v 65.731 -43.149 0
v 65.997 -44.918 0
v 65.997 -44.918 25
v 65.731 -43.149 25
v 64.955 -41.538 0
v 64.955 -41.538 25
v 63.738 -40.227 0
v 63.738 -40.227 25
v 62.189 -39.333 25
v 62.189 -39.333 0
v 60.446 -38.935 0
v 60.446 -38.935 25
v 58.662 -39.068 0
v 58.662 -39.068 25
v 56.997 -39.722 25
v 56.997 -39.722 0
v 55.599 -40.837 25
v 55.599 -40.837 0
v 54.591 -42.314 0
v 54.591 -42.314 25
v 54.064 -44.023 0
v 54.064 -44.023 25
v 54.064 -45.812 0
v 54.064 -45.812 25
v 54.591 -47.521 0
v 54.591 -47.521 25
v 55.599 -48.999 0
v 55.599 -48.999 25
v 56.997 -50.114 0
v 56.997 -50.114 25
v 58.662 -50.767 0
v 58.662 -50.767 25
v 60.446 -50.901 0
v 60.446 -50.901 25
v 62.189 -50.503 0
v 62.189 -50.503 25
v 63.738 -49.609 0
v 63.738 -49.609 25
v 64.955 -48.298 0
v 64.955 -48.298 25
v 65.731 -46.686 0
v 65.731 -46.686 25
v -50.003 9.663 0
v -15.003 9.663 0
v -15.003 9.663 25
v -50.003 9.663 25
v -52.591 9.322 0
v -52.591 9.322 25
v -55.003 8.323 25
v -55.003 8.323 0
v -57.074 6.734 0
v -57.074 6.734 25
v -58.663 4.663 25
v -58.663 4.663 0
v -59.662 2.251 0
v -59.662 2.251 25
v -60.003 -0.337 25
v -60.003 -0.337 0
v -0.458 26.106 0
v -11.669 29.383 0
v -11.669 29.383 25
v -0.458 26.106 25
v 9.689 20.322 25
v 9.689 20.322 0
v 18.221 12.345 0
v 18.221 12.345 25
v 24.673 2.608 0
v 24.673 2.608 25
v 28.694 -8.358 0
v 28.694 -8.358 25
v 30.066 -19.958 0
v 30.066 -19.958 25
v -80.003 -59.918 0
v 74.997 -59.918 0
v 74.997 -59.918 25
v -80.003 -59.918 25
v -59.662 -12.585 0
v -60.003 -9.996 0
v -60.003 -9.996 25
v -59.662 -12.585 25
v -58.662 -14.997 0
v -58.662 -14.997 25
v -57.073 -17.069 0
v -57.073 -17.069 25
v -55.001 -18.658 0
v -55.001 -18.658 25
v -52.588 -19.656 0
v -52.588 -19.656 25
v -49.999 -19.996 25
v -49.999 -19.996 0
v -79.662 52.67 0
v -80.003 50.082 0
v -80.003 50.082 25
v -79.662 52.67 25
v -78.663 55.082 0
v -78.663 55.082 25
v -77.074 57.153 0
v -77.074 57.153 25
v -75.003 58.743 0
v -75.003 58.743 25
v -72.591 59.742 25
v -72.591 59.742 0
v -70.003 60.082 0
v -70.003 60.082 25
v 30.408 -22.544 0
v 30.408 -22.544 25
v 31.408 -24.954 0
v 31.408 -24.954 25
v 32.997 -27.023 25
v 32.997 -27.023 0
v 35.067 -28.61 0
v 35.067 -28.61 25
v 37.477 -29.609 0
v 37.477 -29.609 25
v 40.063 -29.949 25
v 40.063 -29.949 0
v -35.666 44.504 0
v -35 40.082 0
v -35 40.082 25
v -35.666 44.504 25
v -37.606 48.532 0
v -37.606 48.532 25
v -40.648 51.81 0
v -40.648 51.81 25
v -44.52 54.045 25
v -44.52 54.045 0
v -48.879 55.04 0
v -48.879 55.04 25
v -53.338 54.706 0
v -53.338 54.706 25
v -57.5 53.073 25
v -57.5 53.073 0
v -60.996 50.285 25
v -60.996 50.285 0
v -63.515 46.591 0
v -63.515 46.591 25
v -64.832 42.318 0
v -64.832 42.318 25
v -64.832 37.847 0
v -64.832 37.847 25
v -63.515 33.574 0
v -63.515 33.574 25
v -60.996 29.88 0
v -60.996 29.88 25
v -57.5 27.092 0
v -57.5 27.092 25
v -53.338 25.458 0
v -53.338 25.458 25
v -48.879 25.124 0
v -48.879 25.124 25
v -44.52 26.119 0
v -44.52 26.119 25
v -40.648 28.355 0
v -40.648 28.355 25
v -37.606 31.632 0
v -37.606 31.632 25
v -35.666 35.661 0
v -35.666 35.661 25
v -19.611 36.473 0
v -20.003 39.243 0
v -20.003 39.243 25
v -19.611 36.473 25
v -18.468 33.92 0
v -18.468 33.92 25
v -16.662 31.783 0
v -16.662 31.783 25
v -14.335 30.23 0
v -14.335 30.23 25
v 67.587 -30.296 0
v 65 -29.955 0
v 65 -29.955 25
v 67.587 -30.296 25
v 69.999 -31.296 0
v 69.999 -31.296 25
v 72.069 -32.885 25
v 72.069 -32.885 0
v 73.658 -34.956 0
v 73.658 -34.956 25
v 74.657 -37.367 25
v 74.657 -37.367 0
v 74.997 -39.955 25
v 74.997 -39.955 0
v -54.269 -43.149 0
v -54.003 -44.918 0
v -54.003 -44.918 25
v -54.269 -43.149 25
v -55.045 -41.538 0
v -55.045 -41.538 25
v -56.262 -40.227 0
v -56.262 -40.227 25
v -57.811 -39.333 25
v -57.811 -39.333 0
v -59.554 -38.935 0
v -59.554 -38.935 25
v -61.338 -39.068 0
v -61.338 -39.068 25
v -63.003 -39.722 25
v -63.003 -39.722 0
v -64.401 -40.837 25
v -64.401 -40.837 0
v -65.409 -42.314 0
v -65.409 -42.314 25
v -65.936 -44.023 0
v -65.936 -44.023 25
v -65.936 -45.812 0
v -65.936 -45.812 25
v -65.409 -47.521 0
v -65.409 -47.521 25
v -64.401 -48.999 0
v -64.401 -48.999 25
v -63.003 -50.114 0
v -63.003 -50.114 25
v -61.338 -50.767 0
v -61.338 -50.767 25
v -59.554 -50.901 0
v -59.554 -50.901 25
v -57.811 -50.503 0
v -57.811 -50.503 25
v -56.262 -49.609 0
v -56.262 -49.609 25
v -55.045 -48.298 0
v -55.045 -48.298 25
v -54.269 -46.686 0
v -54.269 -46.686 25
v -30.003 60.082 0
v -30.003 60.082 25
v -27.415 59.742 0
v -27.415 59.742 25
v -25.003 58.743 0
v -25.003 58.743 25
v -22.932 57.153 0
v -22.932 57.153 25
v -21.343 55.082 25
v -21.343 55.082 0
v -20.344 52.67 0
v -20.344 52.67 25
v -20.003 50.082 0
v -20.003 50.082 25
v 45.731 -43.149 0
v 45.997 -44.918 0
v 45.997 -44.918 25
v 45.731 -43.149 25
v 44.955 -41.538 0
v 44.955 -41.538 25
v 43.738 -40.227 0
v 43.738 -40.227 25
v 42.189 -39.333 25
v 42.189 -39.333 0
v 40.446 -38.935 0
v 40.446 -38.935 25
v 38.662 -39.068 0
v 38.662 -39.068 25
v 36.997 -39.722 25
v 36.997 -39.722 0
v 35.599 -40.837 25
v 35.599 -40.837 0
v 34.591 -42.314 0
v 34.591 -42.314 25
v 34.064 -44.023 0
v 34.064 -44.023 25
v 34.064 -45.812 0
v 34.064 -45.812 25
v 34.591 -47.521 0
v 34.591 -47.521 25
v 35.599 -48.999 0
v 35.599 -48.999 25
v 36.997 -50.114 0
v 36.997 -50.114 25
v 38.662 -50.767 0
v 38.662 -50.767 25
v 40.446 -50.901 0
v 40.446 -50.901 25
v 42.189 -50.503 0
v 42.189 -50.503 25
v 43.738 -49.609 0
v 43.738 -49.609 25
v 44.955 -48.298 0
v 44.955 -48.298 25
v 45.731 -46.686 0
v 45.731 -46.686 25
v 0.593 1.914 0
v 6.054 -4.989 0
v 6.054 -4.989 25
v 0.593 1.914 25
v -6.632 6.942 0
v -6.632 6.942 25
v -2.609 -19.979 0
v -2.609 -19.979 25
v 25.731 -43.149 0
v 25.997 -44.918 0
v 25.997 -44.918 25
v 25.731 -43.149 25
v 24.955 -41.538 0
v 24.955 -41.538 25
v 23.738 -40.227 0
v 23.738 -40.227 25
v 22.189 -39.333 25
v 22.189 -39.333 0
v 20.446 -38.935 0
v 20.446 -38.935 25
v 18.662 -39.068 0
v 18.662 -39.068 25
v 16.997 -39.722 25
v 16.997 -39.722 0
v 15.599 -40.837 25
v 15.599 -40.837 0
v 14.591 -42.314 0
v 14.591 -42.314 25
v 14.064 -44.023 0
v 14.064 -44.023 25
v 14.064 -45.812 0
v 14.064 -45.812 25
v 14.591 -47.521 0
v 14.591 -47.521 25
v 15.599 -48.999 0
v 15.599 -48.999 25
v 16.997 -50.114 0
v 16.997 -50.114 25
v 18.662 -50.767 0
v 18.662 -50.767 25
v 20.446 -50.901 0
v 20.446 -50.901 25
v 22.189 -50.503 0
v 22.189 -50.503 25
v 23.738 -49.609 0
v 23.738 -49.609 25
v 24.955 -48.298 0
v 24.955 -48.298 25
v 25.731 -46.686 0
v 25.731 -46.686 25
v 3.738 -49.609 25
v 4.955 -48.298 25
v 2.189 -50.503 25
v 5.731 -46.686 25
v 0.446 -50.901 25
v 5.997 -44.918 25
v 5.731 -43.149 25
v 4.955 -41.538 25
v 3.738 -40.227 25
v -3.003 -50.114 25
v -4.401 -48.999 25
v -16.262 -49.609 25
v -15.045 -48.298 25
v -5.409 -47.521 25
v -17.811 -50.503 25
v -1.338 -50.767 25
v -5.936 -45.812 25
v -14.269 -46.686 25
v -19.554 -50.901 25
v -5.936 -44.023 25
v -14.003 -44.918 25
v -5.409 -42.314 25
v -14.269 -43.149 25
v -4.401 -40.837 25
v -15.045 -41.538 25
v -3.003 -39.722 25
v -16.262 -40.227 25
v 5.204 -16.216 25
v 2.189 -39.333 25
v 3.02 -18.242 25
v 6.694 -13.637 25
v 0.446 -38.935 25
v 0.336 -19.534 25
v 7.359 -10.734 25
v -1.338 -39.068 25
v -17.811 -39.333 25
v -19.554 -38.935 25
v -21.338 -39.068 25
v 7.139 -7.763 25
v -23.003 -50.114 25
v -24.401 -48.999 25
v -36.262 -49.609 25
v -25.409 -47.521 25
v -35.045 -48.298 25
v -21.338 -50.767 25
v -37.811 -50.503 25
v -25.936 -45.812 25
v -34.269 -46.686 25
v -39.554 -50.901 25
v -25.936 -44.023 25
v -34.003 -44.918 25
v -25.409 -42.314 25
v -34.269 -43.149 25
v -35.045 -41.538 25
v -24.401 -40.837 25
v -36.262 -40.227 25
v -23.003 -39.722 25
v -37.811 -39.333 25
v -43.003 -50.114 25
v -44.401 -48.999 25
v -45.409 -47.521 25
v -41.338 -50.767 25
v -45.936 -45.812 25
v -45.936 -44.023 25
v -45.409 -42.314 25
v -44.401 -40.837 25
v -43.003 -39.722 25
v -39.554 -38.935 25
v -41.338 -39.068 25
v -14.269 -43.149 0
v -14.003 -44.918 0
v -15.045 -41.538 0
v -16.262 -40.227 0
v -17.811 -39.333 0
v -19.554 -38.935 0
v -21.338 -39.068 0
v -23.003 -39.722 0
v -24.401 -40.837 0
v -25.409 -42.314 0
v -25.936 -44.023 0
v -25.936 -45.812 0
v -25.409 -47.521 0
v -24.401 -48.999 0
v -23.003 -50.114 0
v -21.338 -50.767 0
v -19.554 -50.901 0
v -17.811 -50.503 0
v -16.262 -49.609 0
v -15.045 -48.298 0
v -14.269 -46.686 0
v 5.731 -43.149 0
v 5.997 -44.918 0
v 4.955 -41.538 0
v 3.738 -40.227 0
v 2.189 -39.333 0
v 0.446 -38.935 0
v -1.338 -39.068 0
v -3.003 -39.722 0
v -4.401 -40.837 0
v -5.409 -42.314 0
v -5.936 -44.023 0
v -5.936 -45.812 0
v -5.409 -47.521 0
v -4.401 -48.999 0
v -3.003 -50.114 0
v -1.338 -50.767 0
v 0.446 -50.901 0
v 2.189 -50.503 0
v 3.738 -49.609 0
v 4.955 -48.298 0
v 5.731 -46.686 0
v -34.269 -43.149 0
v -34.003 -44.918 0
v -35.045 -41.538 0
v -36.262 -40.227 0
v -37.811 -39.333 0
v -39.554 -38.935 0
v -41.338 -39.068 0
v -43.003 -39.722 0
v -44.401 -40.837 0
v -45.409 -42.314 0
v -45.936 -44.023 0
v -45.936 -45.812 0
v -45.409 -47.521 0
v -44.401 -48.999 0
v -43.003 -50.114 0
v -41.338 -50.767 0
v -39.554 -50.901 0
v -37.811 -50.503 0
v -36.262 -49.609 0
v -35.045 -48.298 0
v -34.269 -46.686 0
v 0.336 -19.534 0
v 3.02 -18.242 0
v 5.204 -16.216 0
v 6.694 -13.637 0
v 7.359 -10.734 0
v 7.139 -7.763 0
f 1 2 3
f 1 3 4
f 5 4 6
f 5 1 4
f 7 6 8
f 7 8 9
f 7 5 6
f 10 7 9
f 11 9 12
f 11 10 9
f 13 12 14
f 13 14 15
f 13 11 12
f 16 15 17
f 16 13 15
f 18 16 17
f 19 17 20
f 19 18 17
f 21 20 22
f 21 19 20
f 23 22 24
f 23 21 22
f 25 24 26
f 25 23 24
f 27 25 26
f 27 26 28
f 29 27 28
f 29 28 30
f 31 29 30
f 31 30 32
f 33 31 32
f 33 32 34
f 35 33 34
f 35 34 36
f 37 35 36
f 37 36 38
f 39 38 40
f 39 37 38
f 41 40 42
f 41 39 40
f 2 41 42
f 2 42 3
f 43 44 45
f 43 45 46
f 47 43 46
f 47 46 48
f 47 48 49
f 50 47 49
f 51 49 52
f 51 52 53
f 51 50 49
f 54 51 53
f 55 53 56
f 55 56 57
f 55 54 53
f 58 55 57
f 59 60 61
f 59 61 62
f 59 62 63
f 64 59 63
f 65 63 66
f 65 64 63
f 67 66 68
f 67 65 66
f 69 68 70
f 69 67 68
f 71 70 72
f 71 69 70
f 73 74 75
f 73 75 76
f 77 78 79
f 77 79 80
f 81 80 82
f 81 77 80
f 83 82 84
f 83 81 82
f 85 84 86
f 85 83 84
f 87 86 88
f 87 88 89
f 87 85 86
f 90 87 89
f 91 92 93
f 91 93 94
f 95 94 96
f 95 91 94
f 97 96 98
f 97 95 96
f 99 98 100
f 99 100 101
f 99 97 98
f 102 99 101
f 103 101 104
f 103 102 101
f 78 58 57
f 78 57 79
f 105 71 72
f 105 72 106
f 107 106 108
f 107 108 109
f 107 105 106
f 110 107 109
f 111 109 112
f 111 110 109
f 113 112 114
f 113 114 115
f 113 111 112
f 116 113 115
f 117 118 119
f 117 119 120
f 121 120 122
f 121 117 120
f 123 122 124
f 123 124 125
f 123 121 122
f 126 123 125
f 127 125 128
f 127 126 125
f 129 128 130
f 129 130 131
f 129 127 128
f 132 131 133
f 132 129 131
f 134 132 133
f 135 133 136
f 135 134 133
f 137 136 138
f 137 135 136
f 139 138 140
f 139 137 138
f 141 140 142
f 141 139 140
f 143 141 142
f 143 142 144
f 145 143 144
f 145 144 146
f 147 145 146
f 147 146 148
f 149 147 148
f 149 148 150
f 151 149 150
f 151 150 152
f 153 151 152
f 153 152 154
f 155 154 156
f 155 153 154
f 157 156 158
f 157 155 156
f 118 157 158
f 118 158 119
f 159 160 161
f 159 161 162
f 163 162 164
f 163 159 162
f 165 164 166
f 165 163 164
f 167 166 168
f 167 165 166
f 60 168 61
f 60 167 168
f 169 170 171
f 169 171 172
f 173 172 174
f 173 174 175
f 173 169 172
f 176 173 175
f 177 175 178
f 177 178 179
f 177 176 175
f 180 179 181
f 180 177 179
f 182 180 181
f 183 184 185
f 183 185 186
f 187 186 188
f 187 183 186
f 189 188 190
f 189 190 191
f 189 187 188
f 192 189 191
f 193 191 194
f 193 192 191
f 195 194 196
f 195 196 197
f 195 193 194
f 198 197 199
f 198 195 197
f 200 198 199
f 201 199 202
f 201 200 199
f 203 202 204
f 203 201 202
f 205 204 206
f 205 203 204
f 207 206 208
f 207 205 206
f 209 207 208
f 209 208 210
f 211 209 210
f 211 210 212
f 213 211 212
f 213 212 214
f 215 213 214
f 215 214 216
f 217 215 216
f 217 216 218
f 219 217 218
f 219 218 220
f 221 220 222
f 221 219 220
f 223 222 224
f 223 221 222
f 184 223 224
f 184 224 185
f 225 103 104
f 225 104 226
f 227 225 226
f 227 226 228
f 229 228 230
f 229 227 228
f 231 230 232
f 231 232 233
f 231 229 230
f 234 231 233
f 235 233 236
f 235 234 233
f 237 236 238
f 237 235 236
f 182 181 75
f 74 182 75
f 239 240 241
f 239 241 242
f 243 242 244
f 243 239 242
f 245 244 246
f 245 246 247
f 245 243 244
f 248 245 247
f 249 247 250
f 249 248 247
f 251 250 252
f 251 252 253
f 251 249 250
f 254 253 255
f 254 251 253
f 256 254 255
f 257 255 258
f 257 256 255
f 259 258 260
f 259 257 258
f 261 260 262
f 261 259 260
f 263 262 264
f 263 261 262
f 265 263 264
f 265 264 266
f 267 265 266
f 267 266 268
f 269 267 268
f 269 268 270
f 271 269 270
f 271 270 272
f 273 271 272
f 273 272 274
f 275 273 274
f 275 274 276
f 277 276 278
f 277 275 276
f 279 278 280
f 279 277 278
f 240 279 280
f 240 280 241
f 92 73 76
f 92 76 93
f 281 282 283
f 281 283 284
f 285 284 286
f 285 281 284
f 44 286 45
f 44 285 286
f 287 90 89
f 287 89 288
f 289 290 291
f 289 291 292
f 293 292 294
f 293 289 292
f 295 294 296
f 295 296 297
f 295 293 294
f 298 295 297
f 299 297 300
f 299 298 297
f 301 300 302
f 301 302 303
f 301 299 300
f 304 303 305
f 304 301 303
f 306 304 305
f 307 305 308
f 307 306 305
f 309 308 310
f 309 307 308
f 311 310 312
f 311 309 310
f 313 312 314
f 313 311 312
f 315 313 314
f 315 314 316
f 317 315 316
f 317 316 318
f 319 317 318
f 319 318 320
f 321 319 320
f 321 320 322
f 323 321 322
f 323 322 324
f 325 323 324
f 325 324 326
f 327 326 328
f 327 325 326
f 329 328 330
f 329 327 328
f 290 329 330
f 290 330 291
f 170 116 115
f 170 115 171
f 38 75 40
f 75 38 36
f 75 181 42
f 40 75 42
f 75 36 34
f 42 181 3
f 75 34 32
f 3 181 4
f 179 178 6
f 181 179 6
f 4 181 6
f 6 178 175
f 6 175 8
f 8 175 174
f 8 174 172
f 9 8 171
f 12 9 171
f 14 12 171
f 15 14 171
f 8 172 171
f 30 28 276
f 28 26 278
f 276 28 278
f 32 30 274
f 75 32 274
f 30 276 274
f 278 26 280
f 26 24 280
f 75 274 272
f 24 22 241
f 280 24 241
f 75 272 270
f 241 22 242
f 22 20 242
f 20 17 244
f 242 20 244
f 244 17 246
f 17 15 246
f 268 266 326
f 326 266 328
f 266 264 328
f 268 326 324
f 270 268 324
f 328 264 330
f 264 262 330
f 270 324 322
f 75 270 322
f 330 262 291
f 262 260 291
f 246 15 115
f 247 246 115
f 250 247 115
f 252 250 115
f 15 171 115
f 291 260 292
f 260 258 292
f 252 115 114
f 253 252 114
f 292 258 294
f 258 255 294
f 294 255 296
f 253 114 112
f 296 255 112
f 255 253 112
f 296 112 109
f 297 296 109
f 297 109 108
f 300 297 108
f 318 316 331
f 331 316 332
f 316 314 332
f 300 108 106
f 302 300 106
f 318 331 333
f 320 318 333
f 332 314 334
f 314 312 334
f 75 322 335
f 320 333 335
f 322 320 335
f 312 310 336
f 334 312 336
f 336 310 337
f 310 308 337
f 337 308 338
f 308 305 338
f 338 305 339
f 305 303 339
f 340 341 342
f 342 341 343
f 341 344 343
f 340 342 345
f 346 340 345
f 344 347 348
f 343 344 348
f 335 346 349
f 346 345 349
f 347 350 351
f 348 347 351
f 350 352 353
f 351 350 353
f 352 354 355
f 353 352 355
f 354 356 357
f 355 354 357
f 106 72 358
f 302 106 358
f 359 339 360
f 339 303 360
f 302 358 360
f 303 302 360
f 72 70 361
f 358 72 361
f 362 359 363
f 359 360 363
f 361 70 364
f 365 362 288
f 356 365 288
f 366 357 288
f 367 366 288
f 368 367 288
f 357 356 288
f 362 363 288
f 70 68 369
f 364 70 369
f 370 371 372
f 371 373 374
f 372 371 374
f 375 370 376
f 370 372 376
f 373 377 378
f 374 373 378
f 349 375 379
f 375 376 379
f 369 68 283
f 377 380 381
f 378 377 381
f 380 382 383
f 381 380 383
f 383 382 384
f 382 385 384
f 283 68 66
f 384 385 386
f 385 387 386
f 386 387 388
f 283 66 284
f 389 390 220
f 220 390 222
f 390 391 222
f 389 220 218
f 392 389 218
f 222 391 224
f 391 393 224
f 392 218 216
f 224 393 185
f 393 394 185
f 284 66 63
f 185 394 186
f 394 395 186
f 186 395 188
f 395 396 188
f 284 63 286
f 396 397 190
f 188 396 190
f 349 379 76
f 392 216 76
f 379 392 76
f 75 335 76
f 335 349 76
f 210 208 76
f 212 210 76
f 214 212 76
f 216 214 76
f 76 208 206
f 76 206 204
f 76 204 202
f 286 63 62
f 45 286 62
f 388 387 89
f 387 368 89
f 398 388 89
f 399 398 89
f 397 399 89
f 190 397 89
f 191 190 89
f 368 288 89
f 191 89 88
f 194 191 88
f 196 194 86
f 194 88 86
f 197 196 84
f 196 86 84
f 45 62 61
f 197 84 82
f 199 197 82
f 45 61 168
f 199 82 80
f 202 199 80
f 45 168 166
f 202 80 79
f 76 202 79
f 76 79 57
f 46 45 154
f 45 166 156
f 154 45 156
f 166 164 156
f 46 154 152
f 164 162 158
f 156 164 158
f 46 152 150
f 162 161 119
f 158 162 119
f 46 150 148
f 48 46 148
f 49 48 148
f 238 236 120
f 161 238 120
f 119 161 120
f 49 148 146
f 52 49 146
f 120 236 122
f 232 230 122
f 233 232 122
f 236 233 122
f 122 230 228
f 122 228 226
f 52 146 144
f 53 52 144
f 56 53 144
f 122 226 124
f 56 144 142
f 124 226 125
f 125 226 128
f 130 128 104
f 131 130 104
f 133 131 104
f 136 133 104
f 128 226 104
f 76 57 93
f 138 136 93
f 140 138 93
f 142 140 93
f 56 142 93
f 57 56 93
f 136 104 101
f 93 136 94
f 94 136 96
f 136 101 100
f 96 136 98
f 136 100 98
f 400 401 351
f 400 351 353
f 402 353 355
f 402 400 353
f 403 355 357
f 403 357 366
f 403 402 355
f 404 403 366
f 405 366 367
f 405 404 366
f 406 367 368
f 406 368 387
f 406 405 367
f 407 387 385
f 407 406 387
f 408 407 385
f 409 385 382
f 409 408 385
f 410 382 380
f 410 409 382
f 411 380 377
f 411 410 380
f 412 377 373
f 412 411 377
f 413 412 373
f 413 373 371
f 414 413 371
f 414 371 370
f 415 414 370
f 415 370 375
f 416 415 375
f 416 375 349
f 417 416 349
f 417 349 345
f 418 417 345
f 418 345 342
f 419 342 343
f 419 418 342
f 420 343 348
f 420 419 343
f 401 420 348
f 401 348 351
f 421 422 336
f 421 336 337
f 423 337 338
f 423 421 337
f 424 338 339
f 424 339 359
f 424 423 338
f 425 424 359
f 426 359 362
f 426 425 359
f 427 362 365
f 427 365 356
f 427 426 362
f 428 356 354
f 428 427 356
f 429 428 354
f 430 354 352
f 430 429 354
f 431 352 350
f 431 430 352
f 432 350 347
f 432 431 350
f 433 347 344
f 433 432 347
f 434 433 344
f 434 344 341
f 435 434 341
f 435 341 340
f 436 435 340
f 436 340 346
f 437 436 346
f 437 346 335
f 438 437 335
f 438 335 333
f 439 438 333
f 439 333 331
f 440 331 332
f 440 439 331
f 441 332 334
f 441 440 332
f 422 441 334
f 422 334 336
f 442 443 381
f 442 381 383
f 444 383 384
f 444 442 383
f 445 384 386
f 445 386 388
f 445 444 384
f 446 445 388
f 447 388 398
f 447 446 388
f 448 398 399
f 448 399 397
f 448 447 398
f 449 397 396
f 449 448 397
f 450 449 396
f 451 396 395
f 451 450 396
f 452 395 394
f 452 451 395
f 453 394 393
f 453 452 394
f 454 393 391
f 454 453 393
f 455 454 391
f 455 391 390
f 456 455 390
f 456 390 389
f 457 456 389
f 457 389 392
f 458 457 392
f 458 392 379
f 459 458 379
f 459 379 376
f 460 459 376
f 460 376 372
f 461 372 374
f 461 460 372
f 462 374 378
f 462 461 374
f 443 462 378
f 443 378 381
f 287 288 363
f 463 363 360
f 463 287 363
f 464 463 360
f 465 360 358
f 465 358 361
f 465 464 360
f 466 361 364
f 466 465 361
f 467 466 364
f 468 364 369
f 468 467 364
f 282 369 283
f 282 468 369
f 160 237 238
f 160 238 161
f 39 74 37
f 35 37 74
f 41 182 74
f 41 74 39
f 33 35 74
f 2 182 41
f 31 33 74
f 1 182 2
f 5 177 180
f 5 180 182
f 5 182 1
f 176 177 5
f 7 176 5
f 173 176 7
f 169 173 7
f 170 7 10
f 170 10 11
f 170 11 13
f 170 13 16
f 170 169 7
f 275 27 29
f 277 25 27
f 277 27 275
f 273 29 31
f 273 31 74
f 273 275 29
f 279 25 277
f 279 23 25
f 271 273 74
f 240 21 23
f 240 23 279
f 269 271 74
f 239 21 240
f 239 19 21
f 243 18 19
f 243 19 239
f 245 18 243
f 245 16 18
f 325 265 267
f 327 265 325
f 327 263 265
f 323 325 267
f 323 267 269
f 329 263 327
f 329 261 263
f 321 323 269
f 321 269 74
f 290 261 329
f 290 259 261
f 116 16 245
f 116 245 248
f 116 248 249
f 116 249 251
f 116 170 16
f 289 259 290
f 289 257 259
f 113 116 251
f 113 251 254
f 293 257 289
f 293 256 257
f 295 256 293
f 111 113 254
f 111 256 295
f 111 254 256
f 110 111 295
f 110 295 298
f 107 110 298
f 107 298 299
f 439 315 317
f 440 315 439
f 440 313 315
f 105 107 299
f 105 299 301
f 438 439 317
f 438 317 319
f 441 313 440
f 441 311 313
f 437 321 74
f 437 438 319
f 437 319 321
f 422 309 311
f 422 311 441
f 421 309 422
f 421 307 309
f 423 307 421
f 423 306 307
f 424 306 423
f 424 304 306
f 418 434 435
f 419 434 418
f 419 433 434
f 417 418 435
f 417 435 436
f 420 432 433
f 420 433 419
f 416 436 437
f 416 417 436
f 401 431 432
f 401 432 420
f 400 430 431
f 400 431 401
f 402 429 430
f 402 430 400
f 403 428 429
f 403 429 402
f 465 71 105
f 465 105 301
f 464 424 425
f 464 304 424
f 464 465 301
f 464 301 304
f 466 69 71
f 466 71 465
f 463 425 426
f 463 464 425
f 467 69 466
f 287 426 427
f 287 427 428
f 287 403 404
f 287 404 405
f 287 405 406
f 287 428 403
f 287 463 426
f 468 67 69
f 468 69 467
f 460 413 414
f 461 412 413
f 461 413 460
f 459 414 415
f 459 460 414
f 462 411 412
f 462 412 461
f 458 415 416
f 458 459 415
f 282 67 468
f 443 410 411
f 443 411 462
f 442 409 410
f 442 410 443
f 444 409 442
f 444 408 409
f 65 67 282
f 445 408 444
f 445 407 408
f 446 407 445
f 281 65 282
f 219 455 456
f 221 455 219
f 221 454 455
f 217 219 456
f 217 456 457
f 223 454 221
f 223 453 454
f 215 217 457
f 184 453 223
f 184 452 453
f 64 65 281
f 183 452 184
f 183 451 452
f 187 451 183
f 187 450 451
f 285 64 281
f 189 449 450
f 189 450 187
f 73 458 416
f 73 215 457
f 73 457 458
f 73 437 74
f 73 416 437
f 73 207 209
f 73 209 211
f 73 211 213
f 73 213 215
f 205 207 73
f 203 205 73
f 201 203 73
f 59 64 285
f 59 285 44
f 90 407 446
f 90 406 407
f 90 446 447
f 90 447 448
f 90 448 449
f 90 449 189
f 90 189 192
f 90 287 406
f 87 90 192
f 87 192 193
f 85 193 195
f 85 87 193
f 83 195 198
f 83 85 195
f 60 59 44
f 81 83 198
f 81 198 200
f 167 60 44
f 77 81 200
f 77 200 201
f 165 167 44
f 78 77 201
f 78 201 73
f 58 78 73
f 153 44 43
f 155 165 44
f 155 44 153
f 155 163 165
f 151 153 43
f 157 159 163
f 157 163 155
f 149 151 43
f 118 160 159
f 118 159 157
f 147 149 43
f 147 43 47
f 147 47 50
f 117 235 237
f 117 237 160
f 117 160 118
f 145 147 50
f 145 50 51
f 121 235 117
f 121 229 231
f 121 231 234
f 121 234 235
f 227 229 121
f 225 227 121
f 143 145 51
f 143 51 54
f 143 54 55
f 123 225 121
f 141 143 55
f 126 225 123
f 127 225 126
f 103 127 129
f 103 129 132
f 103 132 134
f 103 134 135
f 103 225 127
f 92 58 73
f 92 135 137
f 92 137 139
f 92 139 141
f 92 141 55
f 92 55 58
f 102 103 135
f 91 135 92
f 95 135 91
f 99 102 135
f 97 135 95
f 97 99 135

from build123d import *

# Parameters (mm, degrees)
SKETCH1_R           = 15
SKETCH1_R_2         = 6
BOSS_EXTRUDE1_DEPTH = 25


with BuildPart() as part:
    # Sketch1 → Boss-Extrude1 (new body)
    with BuildSketch(Plane.XY):
        with BuildLine():
            Line((40.063427207, -29.949425047), (64.999534256, -29.955194996))
            ThreePointArc((64.999534256, -29.955194996), (72.069106212, -32.884945049), (74.997220362, -39.955194729))
            Line((74.997220362, -39.955194729), (74.997220362, -59.917750729))
            Line((74.997220362, -59.917750729), (-80.002779638, -59.917750729))
            Line((-80.002779638, -59.917750729), (-80.002779638, 50.082249271))
            ThreePointArc((-80.002779638, 50.082249271), (-77.073847449, 57.153317083), (-70.002779638, 60.082249271))
            Line((-70.002779638, 60.082249271), (-30.002779638, 60.082249271))
            ThreePointArc((-30.002779638, 60.082249271), (-22.931711826, 57.153317083), (-20.002779638, 50.082249271))
            Line((-20.002779638, 50.082249271), (-20.002779638, 39.24305603))
            ThreePointArc((-20.002779638, 39.24305603), (-17.640405796, 32.788083786), (-11.669446304, 29.382923058))
            ThreePointArc((-11.669446304, 29.382923058), (18.22116437, 12.344839461), (30.065744482, -19.957649933))
            ThreePointArc((30.065744482, -19.957649933), (32.996763354, -27.022582575), (40.063427207, -29.949425047))
        make_face()
        with Locations((-50, 40.082249271)):
            Circle(SKETCH1_R, mode=Mode.SUBTRACT)
        with Locations((-60.002779638, -44.917750729)):
            Circle(SKETCH1_R_2, mode=Mode.SUBTRACT)
        with Locations((-40.002779638, -44.917750729)):
            Circle(SKETCH1_R_2, mode=Mode.SUBTRACT)
        with Locations((-20.002779638, -44.917750729)):
            Circle(SKETCH1_R_2, mode=Mode.SUBTRACT)
        with Locations((-0.002779638, -44.917750729)):
            Circle(SKETCH1_R_2, mode=Mode.SUBTRACT)
        with Locations((19.997220362, -44.917750729)):
            Circle(SKETCH1_R_2, mode=Mode.SUBTRACT)
        with Locations((39.997220362, -44.917750729)):
            Circle(SKETCH1_R_2, mode=Mode.SUBTRACT)
        with Locations((59.997220362, -44.917750729)):
            Circle(SKETCH1_R_2, mode=Mode.SUBTRACT)
        with BuildLine():
            Line((-15.002779638, 9.662657115), (-50.002779638, 9.662657115))
            ThreePointArc((-50.002779638, 9.662657115), (-57.073847449, 6.733724927), (-60.002779638, -0.337342885))
            Line((-60.002779638, -0.337342885), (-60.002779638, -9.996302817))
            ThreePointArc((-60.002779638, -9.996302817), (-57.072540419, -17.068677418), (-49.999083138, -19.996302134))
            Line((-49.999083138, -19.996302134), (-2.608906127, -19.978784358))
            ThreePointArc((-2.608906127, -19.978784358), (6.045547234, -14.982427813), (6.053700131, -4.989276396))
            ThreePointArc((6.053700131, -4.989276396), (-2.834464117, 4.693663889), (-15.002779638, 9.662657115))
        make_face(mode=Mode.SUBTRACT)
    extrude(amount=BOSS_EXTRUDE1_DEPTH)


solid = part.part
